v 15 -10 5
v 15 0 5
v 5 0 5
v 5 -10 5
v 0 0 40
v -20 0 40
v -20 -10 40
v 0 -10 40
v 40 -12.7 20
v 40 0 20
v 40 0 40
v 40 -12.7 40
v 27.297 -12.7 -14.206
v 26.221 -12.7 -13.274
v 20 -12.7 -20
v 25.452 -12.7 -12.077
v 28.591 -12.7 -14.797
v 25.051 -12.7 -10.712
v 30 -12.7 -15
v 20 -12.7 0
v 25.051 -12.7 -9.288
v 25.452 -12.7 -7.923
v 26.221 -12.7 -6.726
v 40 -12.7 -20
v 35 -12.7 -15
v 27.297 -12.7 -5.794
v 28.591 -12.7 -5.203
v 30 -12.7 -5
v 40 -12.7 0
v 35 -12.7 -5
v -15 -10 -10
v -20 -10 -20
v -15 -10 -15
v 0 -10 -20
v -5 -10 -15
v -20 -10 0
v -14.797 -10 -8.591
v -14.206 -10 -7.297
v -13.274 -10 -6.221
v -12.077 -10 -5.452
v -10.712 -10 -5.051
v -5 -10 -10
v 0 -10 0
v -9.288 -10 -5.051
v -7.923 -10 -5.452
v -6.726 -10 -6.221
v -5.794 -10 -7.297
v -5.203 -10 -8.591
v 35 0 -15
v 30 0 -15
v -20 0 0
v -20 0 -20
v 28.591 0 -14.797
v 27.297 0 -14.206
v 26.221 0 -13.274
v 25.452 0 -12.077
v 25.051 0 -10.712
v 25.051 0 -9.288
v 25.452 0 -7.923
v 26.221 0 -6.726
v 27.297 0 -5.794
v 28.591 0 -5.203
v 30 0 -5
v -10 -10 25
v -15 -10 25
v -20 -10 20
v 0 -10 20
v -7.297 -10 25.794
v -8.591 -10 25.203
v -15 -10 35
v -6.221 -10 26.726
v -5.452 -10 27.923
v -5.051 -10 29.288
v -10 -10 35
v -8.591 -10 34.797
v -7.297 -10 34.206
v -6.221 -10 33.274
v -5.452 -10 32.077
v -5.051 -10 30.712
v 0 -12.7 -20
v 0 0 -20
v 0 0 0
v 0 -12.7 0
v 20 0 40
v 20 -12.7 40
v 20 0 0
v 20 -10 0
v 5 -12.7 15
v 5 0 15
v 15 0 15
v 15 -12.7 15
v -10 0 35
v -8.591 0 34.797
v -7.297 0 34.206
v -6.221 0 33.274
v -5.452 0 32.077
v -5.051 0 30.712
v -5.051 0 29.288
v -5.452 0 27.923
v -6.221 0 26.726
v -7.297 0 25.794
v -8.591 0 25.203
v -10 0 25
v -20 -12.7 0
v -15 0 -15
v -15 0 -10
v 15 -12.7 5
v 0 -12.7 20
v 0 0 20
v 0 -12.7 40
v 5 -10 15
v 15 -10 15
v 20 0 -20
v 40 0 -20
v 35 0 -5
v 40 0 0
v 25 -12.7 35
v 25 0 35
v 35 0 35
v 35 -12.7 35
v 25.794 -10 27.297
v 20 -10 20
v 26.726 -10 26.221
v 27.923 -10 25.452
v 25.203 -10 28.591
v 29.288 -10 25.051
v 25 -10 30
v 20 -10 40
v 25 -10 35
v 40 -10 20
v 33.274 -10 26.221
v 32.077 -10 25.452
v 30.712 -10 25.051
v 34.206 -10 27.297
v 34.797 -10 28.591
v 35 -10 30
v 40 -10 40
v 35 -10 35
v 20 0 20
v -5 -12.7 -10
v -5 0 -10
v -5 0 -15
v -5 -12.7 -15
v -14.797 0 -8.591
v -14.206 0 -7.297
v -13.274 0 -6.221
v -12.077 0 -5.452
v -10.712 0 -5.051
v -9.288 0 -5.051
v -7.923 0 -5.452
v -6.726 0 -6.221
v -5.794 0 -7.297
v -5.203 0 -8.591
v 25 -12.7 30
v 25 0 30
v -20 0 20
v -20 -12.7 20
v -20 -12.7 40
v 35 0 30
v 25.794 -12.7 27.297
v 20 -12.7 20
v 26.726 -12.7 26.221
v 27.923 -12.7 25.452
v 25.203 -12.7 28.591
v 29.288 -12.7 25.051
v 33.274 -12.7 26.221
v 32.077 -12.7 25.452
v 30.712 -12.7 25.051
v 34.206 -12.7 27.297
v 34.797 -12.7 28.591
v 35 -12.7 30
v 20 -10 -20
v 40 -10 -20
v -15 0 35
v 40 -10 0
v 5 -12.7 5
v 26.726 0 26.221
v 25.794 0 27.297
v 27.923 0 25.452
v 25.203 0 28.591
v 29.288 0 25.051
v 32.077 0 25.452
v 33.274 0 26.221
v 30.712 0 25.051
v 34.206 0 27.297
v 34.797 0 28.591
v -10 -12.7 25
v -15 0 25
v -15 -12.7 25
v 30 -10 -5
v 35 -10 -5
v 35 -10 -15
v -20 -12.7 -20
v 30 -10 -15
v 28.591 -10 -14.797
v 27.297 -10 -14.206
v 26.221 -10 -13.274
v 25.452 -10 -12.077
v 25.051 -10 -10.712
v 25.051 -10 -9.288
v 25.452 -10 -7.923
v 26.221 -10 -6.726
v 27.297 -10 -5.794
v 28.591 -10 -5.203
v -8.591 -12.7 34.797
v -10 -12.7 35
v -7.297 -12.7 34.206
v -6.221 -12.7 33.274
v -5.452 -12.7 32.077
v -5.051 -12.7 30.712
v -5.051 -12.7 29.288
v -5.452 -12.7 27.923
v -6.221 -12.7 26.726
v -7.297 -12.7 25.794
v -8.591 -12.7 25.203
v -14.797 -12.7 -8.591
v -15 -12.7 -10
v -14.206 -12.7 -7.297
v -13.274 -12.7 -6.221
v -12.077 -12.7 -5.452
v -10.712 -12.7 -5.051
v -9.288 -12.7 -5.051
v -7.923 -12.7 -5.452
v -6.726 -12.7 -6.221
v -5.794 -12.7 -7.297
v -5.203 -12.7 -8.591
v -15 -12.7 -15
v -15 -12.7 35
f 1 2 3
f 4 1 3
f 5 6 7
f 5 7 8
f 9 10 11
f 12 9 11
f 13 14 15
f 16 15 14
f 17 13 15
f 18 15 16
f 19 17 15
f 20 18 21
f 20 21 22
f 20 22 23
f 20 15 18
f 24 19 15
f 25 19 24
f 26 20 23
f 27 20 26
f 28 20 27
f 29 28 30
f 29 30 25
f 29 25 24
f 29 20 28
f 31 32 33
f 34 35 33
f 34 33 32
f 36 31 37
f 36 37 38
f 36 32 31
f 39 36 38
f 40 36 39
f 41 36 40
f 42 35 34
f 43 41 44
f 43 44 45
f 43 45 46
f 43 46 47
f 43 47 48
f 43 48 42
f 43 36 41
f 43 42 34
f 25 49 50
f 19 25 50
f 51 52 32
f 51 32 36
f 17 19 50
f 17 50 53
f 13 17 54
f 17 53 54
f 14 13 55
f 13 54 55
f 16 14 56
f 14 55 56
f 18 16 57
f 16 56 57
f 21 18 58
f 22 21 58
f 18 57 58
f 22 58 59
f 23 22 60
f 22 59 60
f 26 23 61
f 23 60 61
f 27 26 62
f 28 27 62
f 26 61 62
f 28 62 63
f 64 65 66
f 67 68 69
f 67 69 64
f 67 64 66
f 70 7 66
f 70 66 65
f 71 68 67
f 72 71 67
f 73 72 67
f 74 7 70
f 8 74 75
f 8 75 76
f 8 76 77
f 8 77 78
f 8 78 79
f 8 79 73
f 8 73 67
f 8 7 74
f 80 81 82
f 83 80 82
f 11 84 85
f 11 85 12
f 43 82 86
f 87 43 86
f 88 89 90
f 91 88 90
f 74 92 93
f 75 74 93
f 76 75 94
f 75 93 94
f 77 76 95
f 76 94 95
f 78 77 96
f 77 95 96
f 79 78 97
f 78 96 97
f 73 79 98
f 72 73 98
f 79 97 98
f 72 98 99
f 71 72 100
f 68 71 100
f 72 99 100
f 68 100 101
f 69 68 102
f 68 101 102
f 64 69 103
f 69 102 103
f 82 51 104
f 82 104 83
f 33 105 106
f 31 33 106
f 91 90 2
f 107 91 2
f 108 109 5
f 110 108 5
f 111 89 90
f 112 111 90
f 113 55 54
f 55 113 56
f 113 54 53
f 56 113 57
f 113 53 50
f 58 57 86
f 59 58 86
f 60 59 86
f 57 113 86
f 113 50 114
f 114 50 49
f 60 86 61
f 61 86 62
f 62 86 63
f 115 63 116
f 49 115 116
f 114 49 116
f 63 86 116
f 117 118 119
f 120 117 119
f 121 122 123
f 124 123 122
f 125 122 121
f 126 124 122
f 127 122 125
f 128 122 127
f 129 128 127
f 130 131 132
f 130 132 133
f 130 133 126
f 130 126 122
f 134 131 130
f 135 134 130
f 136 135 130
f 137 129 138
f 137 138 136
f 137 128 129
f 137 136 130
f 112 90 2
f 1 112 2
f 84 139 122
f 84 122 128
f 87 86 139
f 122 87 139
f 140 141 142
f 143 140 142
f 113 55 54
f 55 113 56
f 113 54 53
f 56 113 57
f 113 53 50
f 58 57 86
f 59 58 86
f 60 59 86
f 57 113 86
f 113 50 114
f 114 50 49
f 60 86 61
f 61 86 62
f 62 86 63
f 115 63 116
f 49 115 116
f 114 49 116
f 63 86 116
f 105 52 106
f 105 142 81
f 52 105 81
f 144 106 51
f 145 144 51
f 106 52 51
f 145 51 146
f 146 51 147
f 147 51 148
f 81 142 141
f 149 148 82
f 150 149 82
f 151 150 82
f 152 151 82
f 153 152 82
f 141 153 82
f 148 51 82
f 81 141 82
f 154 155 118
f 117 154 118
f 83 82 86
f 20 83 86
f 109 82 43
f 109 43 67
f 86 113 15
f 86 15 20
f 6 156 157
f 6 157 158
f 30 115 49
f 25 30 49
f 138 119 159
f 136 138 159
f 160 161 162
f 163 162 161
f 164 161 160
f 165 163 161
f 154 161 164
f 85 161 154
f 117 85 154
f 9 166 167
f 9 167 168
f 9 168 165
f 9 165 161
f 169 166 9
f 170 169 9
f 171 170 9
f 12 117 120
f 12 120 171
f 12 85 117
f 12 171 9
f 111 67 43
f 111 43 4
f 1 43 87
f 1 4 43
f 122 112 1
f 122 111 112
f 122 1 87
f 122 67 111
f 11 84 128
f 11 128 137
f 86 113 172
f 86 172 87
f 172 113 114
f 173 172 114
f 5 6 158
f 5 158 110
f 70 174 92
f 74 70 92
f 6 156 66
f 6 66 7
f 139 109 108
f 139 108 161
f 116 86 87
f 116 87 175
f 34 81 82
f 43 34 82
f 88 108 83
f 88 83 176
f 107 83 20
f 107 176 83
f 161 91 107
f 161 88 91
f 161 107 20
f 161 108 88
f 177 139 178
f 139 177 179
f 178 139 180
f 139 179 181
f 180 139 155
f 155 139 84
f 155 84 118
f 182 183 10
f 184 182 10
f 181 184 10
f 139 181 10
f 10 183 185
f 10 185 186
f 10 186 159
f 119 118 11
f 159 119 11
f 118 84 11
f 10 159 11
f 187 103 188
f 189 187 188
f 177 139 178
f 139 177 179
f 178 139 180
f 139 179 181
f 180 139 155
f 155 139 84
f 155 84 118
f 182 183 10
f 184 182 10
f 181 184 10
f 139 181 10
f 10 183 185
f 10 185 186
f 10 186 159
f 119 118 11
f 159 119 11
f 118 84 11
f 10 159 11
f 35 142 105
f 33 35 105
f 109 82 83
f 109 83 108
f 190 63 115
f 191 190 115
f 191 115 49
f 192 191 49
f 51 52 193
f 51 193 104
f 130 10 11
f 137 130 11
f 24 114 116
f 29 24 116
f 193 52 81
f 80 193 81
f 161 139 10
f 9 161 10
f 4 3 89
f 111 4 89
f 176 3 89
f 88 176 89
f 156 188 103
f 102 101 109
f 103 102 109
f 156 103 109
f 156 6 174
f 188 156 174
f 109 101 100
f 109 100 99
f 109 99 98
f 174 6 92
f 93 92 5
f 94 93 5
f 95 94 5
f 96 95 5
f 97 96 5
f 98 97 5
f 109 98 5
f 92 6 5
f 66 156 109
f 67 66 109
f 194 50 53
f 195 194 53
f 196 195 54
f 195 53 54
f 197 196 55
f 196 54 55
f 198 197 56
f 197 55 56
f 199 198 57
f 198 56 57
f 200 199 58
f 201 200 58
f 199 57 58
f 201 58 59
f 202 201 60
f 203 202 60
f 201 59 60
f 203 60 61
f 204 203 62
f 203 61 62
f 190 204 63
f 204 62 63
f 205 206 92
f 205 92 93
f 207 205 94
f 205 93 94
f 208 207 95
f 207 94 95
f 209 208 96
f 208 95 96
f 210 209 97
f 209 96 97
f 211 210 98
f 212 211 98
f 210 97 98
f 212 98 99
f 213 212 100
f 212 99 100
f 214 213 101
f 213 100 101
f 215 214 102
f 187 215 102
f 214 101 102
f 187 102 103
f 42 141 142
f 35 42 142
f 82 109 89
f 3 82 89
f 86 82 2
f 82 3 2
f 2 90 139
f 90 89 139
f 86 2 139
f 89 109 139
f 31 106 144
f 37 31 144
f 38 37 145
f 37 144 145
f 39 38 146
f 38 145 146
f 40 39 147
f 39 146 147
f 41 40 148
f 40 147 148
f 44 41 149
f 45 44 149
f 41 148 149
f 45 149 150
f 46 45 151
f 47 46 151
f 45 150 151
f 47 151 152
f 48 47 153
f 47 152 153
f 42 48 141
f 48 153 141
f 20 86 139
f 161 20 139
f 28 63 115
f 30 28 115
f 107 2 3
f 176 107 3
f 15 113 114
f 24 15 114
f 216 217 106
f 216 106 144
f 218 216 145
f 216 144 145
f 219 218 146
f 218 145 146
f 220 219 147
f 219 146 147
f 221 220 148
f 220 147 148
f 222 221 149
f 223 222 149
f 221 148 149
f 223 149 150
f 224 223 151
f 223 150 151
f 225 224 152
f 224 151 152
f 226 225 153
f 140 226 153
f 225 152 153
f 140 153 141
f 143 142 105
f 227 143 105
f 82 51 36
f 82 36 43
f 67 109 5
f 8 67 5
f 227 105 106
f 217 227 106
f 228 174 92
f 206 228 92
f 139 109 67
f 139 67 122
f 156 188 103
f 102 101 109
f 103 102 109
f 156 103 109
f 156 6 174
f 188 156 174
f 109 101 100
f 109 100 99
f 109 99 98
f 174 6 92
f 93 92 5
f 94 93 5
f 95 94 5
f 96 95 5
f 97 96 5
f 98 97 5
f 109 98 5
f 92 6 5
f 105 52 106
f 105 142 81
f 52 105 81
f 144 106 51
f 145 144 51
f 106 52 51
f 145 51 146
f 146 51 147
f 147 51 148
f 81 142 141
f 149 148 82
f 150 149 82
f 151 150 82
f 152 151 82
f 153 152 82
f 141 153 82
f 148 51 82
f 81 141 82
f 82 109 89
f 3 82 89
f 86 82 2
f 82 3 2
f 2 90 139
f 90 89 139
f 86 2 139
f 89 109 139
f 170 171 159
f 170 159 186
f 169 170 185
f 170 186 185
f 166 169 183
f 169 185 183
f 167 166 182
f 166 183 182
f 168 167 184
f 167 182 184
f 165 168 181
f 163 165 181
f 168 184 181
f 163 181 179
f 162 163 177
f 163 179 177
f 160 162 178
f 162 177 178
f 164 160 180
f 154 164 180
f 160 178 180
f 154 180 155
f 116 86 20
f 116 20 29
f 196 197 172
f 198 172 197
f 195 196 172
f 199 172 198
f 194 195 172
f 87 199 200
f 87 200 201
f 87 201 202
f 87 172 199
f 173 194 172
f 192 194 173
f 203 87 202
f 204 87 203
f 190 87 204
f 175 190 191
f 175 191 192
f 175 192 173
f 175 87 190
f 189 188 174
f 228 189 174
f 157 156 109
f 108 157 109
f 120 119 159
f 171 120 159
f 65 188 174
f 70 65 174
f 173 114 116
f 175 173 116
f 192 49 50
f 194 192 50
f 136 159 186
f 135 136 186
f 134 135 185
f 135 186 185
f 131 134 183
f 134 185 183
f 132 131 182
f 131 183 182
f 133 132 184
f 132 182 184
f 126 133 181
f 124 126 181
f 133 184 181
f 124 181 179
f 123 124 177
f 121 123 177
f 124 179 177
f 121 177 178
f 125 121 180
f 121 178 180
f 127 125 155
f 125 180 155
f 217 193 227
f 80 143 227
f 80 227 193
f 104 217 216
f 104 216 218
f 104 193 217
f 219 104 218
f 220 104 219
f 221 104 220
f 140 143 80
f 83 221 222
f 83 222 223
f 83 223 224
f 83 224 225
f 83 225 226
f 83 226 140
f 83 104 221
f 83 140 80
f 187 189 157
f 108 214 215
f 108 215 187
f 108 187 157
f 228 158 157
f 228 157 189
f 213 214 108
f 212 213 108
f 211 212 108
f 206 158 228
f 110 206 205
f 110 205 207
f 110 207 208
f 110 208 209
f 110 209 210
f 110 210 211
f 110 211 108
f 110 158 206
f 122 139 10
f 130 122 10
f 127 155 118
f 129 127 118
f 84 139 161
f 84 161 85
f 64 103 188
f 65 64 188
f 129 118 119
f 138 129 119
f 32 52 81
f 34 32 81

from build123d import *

# Parameters (mm, degrees)
F0_W     = 20
F0_H     = 20
F1_DEPTH = 10
F2_DEPTH = 12.7


with BuildPart() as f1:
    # F0 (on Front) → F1 (new body)
    with BuildSketch(Plane.XZ):
        with Locations((10, 10)):
            Rectangle(F0_W, F0_H)
        Polygon((15, 10), (15, 5), (10, 5), (5, 5), (5, 10), (5, 15), (10, 15), (15, 15), align=None, mode=Mode.SUBTRACT)
        with Locations((-10, 30)):
            Rectangle(F0_W, F0_H)
        with BuildLine():
            ThreePointArc((-10, 35), (-5, 30), (-10, 25))
            Line((-10, 25), (-15, 25))
            Line((-15, 25), (-15, 35))
            Line((-15, 35), (-10, 35))
        make_face(mode=Mode.SUBTRACT)
        with Locations((30, 30)):
            Rectangle(F0_W, F0_H)
        with BuildLine():
            Line((25, 35), (35, 35))
            Line((35, 35), (35, 30))
            ThreePointArc((35, 30), (30, 25), (25, 30))
            Line((25, 30), (25, 35))
        make_face(mode=Mode.SUBTRACT)
        with Locations((30, -10)):
            Rectangle(F0_W, F0_H)
        with BuildLine():
            Line((35, -5), (35, -15))
            Line((35, -15), (30, -15))
            ThreePointArc((30, -15), (25, -10), (30, -5))
            Line((30, -5), (35, -5))
        make_face(mode=Mode.SUBTRACT)
        with Locations((-10, -10)):
            Rectangle(F0_W, F0_H)
        with BuildLine():
            Line((-5, -10), (-5, -15))
            Line((-5, -15), (-15, -15))
            Line((-15, -15), (-15, -10))
            ThreePointArc((-15, -10), (-10, -5), (-5, -10))
        make_face(mode=Mode.SUBTRACT)
    extrude(amount=F1_DEPTH)


with BuildPart() as f2:
    # F0 (on Front) → F2 (new body)
    with BuildSketch(Plane.XZ):
        with Locations((10, 10)):
            Rectangle(F0_W, F0_H)
        Polygon((15, 10), (15, 5), (10, 5), (5, 5), (5, 10), (5, 15), (10, 15), (15, 15), align=None, mode=Mode.SUBTRACT)
        with Locations((-10, 30)):
            Rectangle(F0_W, F0_H)
        with BuildLine():
            ThreePointArc((-10, 35), (-5, 30), (-10, 25))
            Line((-10, 25), (-15, 25))
            Line((-15, 25), (-15, 35))
            Line((-15, 35), (-10, 35))
        make_face(mode=Mode.SUBTRACT)
        with Locations((30, 30)):
            Rectangle(F0_W, F0_H)
        with BuildLine():
            Line((25, 35), (35, 35))
            Line((35, 35), (35, 30))
            ThreePointArc((35, 30), (30, 25), (25, 30))
            Line((25, 30), (25, 35))
        make_face(mode=Mode.SUBTRACT)
        with Locations((30, -10)):
            Rectangle(F0_W, F0_H)
        with BuildLine():
            Line((35, -5), (35, -15))
            Line((35, -15), (30, -15))
            ThreePointArc((30, -15), (25, -10), (30, -5))
            Line((30, -5), (35, -5))
        make_face(mode=Mode.SUBTRACT)
        with Locations((-10, -10)):
            Rectangle(F0_W, F0_H)
        with BuildLine():
            Line((-5, -10), (-5, -15))
            Line((-5, -15), (-15, -15))
            Line((-15, -15), (-15, -10))
            ThreePointArc((-15, -10), (-10, -5), (-5, -10))
        make_face(mode=Mode.SUBTRACT)
    extrude(amount=F2_DEPTH)


solid = Compound([f1.part, f2.part])
